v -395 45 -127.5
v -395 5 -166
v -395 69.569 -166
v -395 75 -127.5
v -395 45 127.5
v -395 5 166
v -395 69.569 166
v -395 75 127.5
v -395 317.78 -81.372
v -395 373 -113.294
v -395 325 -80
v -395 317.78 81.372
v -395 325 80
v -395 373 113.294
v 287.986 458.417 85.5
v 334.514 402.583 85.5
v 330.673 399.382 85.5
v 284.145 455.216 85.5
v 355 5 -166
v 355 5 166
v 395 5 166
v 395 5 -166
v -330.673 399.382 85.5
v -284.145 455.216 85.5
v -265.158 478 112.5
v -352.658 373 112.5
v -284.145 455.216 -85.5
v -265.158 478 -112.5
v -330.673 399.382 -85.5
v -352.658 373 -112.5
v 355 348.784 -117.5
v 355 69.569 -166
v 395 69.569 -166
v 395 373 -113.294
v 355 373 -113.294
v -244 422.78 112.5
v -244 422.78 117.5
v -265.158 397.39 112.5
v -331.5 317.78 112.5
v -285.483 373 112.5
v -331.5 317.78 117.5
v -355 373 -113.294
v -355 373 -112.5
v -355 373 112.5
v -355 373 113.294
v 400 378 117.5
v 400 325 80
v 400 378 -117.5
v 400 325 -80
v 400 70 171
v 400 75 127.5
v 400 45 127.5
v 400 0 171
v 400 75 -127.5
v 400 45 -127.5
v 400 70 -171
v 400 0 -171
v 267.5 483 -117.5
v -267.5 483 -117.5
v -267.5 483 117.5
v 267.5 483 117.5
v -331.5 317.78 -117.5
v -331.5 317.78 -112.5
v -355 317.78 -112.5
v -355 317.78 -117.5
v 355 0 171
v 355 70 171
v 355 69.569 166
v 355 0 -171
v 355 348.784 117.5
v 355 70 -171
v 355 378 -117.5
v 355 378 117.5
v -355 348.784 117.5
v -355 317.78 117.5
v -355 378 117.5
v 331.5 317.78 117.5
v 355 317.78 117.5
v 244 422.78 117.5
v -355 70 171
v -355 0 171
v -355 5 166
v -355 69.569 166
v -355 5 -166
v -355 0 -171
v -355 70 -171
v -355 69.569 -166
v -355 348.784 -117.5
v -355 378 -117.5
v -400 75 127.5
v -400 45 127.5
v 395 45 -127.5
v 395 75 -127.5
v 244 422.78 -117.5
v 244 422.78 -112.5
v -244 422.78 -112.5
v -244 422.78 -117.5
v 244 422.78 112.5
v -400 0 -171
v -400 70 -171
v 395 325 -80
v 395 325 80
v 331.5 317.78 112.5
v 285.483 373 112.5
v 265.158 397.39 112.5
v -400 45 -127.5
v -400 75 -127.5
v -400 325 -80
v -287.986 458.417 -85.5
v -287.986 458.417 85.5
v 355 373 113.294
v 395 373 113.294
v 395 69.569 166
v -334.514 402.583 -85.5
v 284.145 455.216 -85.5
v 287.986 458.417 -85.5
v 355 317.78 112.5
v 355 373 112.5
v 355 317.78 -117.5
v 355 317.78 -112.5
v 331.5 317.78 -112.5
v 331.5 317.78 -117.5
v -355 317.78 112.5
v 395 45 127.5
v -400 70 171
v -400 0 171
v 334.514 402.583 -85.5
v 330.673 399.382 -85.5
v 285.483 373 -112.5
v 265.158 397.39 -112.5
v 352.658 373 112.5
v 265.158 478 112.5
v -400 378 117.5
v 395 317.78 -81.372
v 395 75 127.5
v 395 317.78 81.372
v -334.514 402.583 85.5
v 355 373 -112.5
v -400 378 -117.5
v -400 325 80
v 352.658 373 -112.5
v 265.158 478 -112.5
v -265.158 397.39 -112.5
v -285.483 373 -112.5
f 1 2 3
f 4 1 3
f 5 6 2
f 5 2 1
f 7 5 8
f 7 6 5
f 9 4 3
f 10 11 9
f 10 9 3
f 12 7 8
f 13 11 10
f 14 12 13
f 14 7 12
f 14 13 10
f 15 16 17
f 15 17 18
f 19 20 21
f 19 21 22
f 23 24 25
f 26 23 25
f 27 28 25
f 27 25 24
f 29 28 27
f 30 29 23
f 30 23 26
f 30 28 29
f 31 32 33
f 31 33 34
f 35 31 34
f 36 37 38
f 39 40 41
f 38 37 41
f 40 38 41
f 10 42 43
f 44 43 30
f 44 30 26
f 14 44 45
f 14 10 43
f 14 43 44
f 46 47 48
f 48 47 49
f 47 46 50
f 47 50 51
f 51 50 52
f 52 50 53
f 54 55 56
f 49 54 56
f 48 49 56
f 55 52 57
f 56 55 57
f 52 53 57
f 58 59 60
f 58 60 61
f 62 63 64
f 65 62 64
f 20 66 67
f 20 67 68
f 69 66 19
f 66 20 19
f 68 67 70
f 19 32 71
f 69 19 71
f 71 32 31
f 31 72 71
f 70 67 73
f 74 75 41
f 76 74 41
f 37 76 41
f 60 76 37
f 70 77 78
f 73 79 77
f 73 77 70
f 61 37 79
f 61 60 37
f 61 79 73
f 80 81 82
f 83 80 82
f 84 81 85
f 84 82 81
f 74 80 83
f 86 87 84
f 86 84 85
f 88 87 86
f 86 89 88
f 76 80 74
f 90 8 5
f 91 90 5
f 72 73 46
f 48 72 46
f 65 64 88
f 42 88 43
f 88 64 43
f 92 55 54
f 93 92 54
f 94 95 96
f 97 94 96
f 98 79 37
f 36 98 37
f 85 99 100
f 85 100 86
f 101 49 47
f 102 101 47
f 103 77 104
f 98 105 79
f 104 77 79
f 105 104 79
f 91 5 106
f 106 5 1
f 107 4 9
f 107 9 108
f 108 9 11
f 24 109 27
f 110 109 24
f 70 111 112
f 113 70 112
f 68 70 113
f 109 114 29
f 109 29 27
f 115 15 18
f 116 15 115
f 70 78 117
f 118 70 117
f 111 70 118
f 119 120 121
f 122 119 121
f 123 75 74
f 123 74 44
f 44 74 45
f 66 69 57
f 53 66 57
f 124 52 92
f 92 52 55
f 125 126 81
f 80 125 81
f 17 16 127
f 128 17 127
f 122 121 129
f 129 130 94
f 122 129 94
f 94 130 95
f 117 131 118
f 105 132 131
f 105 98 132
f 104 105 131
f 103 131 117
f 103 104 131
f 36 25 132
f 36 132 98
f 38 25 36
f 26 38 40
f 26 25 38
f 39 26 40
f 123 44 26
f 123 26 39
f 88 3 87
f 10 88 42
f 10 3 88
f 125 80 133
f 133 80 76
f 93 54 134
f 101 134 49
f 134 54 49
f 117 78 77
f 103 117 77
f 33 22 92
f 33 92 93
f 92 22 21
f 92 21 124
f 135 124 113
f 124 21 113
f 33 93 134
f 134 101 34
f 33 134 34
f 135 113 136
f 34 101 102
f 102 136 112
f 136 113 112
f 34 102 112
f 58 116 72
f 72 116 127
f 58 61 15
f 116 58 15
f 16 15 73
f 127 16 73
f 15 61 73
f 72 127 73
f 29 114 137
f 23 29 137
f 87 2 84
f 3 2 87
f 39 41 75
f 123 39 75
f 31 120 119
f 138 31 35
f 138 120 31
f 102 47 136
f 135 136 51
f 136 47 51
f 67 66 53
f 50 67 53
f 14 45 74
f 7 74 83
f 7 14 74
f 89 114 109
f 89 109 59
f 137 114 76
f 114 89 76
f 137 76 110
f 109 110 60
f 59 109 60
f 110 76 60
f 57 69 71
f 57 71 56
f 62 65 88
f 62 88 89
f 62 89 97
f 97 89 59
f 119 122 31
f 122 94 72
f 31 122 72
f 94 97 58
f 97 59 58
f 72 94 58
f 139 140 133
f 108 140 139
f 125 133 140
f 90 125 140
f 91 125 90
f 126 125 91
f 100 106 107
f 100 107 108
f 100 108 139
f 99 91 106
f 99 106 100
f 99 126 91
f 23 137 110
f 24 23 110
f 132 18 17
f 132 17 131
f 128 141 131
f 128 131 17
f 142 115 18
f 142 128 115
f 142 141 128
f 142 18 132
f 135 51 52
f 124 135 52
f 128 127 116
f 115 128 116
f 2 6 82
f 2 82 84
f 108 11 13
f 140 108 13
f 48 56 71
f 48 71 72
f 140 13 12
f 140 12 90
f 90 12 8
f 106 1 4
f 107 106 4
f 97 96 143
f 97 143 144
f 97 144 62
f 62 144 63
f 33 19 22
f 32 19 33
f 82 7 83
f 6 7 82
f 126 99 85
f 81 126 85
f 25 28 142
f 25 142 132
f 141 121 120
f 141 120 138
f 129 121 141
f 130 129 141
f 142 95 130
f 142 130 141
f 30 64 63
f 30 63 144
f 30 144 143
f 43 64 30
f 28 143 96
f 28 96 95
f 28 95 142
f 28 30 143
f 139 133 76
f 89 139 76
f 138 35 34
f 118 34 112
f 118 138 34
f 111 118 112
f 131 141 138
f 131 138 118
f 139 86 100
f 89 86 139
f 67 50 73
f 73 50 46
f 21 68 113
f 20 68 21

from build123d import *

# Parameters (mm, degrees)
CROQUIS1_W              = 800
CROQUIS1_H              = 342
SALIENTE_EXTRUIR1_DEPTH = 483
CROQUIS2_W              = 710
CROQUIS2_H              = 53.5
CORTAR_EXTRUIR1_DEPTH   = 483
CORTAR_EXTRUIR2_DEPTH   = 342
CORTAR_EXTRUIR4_DEPTH   = 800
VACIADO2_START          = -265.15812527
VACIADO2_OUTLINE_W      = 105
VACIADO2_OUTLINE_H      = 225
VACIADO2_DEPTH          = 530.31625054
VACIADO2_START_2        = -395
VACIADO2_2_DEPTH        = 790
VACIADO2_3_DEPTH        = 40
VACIADO2_START_3        = 355
VACIADO2_4_DEPTH        = 40
VACIADO2_START_4        = -112.5
VACIADO2_5_DEPTH        = 225
CROQUIS8_W              = 171
CROQUIS8_H              = 72.679369328
CORTAR_EXTRUIR7_DEPTH   = 113
CROQUIS9_W              = 171
CROQUIS9_H              = 72.679369328
CORTAR_EXTRUIR8_DEPTH   = 113


with BuildPart() as part:
    # Croquis1 → Saliente-Extruir1 (new body)
    with BuildSketch(Plane(origin=(0, 0, 0), x_dir=(1, 0, 0), z_dir=(0, 1, 0))):
        Rectangle(CROQUIS1_W, CROQUIS1_H)
    extrude(amount=SALIENTE_EXTRUIR1_DEPTH)

    # Croquis2 → Cortar-Extruir1 (cut)
    with BuildSketch(Plane(origin=(0, 483, 0), x_dir=(1, 0, 0), z_dir=(0, 1, 0))):
        with Locations((0, 144.25)):
            Rectangle(CROQUIS2_W, CROQUIS2_H)
        with Locations((0, -144.25)):
            Rectangle(CROQUIS2_W, CROQUIS2_H)
    extrude(amount=-CORTAR_EXTRUIR1_DEPTH, mode=Mode.SUBTRACT)

    # Croquis3 → Cortar-Extruir2 (cut)
    with BuildSketch(Plane.XY.offset(171)):
        Polygon((-355, 317.779645743), (-355, 0), (355, 0), (355, 317.779645743), (331.5, 317.779645743), (244, 422.779645743), (-244, 422.779645743), (-331.5, 317.779645743), align=None)
        Polygon((267.5, 483), (355, 378), (400, 378), (400, 483), align=None)
        Polygon((-400, 483), (-400, 378), (-355, 378), (-267.5, 483), align=None)
    extrude(amount=-CORTAR_EXTRUIR2_DEPTH, mode=Mode.SUBTRACT)

    # Croquis4 → Cortar-Extruir4 (cut)
    with BuildSketch(Plane(origin=(400, 0, 0), x_dir=(0, 0, -1), z_dir=(1, 0, 0))):
        Polygon((171, 378), (171, 70), (117.5, 378), align=None)
        Polygon((-171, 70), (-117.5, 378), (-171, 378), align=None)
        Polygon((-127.5, 45), (127.5, 45), (127.5, 75), (80, 325), (-80, 325), (-127.5, 75), align=None)
    extrude(amount=-CORTAR_EXTRUIR4_DEPTH, mode=Mode.SUBTRACT)

    # Vaciado2: read off the stored shape, not the designer's step
    # Vaciado2 outline → Vaciado2 (cut)
    with BuildSketch(Plane.YZ.offset(VACIADO2_START)):
        with Locations((425.5, 0)):
            Rectangle(VACIADO2_OUTLINE_W, VACIADO2_OUTLINE_H)
    extrude(amount=VACIADO2_DEPTH, mode=Mode.SUBTRACT)

    # Vaciado2 2 outline → Vaciado2 2 (cut)
    with BuildSketch(Plane.YZ.offset(VACIADO2_START_2)):
        Polygon((373, -112.5), (373, 112.5), (317.779645743, 112.5), (317.779645743, 81.371867309), (325, 80), (325, -80), (317.779645743, -81.371867309), (317.779645743, -112.5), align=None)
    extrude(amount=VACIADO2_2_DEPTH, mode=Mode.SUBTRACT)

    # Vaciado2 3 outline → Vaciado2 3 (cut)
    with BuildSketch(Plane.YZ.offset(VACIADO2_START_2)):
        Polygon((69.568973838, 166), (5, 166), (5, -166), (69.568973838, -166), (373, -113.293636689), (373, -112.5), (317.779645743, -112.5), (317.779645743, -81.371867309), (75, -127.5), (45, -127.5), (45, 127.5), (75, 127.5), (317.779645743, 81.371867309), (317.779645743, 112.5), (373, 112.5), (373, 113.293636689), align=None)
    extrude(amount=VACIADO2_3_DEPTH, mode=Mode.SUBTRACT)

    # Vaciado2 4 outline → Vaciado2 4 (cut)
    with BuildSketch(Plane.YZ.offset(VACIADO2_START_3)):
        Polygon((69.568973838, 166), (5, 166), (5, -166), (69.568973838, -166), (373, -113.293636689), (373, -112.5), (317.779645743, -112.5), (317.779645743, -81.371867309), (75, -127.5), (45, -127.5), (45, 127.5), (75, 127.5), (317.779645743, 81.371867309), (317.779645743, 112.5), (373, 112.5), (373, 113.293636689), align=None)
    extrude(amount=VACIADO2_4_DEPTH, mode=Mode.SUBTRACT)

    # Vaciado2 5 outline → Vaciado2 5 (cut)
    with BuildSketch(Plane.XY.offset(VACIADO2_START_4)):
        Polygon((352.65812527, 373), (265.15812527, 478), (265.15812527, 397.389895419), (285.483038119, 373), align=None)
        Polygon((-265.15812527, 478), (-352.65812527, 373), (-285.483038119, 373), (-265.15812527, 397.389895419), align=None)
    extrude(amount=VACIADO2_5_DEPTH, mode=Mode.SUBTRACT)

    # Croquis8 → Cortar-Extruir7 (cut)
    with BuildSketch(Plane(origin=(395.409836066, 329.508196721, 0), x_dir=(0, 0, -1), z_dir=(0.7682212795973777, 0.6401843996644778, 0))):
        with Locations((0, 131.461866471)):
            Rectangle(CROQUIS8_W, CROQUIS8_H)
    extrude(amount=-CORTAR_EXTRUIR7_DEPTH, mode=Mode.SUBTRACT)

    # Croquis9 → Cortar-Extruir8 (cut)
    with BuildSketch(Plane(origin=(-395.409836066, 329.508196721, 0), x_dir=(0, 0, 1), z_dir=(-0.7682212795973777, 0.6401843996644778, 0))):
        with Locations((0, 131.461866471)):
            Rectangle(CROQUIS9_W, CROQUIS9_H)
    extrude(amount=-CORTAR_EXTRUIR8_DEPTH, mode=Mode.SUBTRACT)


solid = part.part
